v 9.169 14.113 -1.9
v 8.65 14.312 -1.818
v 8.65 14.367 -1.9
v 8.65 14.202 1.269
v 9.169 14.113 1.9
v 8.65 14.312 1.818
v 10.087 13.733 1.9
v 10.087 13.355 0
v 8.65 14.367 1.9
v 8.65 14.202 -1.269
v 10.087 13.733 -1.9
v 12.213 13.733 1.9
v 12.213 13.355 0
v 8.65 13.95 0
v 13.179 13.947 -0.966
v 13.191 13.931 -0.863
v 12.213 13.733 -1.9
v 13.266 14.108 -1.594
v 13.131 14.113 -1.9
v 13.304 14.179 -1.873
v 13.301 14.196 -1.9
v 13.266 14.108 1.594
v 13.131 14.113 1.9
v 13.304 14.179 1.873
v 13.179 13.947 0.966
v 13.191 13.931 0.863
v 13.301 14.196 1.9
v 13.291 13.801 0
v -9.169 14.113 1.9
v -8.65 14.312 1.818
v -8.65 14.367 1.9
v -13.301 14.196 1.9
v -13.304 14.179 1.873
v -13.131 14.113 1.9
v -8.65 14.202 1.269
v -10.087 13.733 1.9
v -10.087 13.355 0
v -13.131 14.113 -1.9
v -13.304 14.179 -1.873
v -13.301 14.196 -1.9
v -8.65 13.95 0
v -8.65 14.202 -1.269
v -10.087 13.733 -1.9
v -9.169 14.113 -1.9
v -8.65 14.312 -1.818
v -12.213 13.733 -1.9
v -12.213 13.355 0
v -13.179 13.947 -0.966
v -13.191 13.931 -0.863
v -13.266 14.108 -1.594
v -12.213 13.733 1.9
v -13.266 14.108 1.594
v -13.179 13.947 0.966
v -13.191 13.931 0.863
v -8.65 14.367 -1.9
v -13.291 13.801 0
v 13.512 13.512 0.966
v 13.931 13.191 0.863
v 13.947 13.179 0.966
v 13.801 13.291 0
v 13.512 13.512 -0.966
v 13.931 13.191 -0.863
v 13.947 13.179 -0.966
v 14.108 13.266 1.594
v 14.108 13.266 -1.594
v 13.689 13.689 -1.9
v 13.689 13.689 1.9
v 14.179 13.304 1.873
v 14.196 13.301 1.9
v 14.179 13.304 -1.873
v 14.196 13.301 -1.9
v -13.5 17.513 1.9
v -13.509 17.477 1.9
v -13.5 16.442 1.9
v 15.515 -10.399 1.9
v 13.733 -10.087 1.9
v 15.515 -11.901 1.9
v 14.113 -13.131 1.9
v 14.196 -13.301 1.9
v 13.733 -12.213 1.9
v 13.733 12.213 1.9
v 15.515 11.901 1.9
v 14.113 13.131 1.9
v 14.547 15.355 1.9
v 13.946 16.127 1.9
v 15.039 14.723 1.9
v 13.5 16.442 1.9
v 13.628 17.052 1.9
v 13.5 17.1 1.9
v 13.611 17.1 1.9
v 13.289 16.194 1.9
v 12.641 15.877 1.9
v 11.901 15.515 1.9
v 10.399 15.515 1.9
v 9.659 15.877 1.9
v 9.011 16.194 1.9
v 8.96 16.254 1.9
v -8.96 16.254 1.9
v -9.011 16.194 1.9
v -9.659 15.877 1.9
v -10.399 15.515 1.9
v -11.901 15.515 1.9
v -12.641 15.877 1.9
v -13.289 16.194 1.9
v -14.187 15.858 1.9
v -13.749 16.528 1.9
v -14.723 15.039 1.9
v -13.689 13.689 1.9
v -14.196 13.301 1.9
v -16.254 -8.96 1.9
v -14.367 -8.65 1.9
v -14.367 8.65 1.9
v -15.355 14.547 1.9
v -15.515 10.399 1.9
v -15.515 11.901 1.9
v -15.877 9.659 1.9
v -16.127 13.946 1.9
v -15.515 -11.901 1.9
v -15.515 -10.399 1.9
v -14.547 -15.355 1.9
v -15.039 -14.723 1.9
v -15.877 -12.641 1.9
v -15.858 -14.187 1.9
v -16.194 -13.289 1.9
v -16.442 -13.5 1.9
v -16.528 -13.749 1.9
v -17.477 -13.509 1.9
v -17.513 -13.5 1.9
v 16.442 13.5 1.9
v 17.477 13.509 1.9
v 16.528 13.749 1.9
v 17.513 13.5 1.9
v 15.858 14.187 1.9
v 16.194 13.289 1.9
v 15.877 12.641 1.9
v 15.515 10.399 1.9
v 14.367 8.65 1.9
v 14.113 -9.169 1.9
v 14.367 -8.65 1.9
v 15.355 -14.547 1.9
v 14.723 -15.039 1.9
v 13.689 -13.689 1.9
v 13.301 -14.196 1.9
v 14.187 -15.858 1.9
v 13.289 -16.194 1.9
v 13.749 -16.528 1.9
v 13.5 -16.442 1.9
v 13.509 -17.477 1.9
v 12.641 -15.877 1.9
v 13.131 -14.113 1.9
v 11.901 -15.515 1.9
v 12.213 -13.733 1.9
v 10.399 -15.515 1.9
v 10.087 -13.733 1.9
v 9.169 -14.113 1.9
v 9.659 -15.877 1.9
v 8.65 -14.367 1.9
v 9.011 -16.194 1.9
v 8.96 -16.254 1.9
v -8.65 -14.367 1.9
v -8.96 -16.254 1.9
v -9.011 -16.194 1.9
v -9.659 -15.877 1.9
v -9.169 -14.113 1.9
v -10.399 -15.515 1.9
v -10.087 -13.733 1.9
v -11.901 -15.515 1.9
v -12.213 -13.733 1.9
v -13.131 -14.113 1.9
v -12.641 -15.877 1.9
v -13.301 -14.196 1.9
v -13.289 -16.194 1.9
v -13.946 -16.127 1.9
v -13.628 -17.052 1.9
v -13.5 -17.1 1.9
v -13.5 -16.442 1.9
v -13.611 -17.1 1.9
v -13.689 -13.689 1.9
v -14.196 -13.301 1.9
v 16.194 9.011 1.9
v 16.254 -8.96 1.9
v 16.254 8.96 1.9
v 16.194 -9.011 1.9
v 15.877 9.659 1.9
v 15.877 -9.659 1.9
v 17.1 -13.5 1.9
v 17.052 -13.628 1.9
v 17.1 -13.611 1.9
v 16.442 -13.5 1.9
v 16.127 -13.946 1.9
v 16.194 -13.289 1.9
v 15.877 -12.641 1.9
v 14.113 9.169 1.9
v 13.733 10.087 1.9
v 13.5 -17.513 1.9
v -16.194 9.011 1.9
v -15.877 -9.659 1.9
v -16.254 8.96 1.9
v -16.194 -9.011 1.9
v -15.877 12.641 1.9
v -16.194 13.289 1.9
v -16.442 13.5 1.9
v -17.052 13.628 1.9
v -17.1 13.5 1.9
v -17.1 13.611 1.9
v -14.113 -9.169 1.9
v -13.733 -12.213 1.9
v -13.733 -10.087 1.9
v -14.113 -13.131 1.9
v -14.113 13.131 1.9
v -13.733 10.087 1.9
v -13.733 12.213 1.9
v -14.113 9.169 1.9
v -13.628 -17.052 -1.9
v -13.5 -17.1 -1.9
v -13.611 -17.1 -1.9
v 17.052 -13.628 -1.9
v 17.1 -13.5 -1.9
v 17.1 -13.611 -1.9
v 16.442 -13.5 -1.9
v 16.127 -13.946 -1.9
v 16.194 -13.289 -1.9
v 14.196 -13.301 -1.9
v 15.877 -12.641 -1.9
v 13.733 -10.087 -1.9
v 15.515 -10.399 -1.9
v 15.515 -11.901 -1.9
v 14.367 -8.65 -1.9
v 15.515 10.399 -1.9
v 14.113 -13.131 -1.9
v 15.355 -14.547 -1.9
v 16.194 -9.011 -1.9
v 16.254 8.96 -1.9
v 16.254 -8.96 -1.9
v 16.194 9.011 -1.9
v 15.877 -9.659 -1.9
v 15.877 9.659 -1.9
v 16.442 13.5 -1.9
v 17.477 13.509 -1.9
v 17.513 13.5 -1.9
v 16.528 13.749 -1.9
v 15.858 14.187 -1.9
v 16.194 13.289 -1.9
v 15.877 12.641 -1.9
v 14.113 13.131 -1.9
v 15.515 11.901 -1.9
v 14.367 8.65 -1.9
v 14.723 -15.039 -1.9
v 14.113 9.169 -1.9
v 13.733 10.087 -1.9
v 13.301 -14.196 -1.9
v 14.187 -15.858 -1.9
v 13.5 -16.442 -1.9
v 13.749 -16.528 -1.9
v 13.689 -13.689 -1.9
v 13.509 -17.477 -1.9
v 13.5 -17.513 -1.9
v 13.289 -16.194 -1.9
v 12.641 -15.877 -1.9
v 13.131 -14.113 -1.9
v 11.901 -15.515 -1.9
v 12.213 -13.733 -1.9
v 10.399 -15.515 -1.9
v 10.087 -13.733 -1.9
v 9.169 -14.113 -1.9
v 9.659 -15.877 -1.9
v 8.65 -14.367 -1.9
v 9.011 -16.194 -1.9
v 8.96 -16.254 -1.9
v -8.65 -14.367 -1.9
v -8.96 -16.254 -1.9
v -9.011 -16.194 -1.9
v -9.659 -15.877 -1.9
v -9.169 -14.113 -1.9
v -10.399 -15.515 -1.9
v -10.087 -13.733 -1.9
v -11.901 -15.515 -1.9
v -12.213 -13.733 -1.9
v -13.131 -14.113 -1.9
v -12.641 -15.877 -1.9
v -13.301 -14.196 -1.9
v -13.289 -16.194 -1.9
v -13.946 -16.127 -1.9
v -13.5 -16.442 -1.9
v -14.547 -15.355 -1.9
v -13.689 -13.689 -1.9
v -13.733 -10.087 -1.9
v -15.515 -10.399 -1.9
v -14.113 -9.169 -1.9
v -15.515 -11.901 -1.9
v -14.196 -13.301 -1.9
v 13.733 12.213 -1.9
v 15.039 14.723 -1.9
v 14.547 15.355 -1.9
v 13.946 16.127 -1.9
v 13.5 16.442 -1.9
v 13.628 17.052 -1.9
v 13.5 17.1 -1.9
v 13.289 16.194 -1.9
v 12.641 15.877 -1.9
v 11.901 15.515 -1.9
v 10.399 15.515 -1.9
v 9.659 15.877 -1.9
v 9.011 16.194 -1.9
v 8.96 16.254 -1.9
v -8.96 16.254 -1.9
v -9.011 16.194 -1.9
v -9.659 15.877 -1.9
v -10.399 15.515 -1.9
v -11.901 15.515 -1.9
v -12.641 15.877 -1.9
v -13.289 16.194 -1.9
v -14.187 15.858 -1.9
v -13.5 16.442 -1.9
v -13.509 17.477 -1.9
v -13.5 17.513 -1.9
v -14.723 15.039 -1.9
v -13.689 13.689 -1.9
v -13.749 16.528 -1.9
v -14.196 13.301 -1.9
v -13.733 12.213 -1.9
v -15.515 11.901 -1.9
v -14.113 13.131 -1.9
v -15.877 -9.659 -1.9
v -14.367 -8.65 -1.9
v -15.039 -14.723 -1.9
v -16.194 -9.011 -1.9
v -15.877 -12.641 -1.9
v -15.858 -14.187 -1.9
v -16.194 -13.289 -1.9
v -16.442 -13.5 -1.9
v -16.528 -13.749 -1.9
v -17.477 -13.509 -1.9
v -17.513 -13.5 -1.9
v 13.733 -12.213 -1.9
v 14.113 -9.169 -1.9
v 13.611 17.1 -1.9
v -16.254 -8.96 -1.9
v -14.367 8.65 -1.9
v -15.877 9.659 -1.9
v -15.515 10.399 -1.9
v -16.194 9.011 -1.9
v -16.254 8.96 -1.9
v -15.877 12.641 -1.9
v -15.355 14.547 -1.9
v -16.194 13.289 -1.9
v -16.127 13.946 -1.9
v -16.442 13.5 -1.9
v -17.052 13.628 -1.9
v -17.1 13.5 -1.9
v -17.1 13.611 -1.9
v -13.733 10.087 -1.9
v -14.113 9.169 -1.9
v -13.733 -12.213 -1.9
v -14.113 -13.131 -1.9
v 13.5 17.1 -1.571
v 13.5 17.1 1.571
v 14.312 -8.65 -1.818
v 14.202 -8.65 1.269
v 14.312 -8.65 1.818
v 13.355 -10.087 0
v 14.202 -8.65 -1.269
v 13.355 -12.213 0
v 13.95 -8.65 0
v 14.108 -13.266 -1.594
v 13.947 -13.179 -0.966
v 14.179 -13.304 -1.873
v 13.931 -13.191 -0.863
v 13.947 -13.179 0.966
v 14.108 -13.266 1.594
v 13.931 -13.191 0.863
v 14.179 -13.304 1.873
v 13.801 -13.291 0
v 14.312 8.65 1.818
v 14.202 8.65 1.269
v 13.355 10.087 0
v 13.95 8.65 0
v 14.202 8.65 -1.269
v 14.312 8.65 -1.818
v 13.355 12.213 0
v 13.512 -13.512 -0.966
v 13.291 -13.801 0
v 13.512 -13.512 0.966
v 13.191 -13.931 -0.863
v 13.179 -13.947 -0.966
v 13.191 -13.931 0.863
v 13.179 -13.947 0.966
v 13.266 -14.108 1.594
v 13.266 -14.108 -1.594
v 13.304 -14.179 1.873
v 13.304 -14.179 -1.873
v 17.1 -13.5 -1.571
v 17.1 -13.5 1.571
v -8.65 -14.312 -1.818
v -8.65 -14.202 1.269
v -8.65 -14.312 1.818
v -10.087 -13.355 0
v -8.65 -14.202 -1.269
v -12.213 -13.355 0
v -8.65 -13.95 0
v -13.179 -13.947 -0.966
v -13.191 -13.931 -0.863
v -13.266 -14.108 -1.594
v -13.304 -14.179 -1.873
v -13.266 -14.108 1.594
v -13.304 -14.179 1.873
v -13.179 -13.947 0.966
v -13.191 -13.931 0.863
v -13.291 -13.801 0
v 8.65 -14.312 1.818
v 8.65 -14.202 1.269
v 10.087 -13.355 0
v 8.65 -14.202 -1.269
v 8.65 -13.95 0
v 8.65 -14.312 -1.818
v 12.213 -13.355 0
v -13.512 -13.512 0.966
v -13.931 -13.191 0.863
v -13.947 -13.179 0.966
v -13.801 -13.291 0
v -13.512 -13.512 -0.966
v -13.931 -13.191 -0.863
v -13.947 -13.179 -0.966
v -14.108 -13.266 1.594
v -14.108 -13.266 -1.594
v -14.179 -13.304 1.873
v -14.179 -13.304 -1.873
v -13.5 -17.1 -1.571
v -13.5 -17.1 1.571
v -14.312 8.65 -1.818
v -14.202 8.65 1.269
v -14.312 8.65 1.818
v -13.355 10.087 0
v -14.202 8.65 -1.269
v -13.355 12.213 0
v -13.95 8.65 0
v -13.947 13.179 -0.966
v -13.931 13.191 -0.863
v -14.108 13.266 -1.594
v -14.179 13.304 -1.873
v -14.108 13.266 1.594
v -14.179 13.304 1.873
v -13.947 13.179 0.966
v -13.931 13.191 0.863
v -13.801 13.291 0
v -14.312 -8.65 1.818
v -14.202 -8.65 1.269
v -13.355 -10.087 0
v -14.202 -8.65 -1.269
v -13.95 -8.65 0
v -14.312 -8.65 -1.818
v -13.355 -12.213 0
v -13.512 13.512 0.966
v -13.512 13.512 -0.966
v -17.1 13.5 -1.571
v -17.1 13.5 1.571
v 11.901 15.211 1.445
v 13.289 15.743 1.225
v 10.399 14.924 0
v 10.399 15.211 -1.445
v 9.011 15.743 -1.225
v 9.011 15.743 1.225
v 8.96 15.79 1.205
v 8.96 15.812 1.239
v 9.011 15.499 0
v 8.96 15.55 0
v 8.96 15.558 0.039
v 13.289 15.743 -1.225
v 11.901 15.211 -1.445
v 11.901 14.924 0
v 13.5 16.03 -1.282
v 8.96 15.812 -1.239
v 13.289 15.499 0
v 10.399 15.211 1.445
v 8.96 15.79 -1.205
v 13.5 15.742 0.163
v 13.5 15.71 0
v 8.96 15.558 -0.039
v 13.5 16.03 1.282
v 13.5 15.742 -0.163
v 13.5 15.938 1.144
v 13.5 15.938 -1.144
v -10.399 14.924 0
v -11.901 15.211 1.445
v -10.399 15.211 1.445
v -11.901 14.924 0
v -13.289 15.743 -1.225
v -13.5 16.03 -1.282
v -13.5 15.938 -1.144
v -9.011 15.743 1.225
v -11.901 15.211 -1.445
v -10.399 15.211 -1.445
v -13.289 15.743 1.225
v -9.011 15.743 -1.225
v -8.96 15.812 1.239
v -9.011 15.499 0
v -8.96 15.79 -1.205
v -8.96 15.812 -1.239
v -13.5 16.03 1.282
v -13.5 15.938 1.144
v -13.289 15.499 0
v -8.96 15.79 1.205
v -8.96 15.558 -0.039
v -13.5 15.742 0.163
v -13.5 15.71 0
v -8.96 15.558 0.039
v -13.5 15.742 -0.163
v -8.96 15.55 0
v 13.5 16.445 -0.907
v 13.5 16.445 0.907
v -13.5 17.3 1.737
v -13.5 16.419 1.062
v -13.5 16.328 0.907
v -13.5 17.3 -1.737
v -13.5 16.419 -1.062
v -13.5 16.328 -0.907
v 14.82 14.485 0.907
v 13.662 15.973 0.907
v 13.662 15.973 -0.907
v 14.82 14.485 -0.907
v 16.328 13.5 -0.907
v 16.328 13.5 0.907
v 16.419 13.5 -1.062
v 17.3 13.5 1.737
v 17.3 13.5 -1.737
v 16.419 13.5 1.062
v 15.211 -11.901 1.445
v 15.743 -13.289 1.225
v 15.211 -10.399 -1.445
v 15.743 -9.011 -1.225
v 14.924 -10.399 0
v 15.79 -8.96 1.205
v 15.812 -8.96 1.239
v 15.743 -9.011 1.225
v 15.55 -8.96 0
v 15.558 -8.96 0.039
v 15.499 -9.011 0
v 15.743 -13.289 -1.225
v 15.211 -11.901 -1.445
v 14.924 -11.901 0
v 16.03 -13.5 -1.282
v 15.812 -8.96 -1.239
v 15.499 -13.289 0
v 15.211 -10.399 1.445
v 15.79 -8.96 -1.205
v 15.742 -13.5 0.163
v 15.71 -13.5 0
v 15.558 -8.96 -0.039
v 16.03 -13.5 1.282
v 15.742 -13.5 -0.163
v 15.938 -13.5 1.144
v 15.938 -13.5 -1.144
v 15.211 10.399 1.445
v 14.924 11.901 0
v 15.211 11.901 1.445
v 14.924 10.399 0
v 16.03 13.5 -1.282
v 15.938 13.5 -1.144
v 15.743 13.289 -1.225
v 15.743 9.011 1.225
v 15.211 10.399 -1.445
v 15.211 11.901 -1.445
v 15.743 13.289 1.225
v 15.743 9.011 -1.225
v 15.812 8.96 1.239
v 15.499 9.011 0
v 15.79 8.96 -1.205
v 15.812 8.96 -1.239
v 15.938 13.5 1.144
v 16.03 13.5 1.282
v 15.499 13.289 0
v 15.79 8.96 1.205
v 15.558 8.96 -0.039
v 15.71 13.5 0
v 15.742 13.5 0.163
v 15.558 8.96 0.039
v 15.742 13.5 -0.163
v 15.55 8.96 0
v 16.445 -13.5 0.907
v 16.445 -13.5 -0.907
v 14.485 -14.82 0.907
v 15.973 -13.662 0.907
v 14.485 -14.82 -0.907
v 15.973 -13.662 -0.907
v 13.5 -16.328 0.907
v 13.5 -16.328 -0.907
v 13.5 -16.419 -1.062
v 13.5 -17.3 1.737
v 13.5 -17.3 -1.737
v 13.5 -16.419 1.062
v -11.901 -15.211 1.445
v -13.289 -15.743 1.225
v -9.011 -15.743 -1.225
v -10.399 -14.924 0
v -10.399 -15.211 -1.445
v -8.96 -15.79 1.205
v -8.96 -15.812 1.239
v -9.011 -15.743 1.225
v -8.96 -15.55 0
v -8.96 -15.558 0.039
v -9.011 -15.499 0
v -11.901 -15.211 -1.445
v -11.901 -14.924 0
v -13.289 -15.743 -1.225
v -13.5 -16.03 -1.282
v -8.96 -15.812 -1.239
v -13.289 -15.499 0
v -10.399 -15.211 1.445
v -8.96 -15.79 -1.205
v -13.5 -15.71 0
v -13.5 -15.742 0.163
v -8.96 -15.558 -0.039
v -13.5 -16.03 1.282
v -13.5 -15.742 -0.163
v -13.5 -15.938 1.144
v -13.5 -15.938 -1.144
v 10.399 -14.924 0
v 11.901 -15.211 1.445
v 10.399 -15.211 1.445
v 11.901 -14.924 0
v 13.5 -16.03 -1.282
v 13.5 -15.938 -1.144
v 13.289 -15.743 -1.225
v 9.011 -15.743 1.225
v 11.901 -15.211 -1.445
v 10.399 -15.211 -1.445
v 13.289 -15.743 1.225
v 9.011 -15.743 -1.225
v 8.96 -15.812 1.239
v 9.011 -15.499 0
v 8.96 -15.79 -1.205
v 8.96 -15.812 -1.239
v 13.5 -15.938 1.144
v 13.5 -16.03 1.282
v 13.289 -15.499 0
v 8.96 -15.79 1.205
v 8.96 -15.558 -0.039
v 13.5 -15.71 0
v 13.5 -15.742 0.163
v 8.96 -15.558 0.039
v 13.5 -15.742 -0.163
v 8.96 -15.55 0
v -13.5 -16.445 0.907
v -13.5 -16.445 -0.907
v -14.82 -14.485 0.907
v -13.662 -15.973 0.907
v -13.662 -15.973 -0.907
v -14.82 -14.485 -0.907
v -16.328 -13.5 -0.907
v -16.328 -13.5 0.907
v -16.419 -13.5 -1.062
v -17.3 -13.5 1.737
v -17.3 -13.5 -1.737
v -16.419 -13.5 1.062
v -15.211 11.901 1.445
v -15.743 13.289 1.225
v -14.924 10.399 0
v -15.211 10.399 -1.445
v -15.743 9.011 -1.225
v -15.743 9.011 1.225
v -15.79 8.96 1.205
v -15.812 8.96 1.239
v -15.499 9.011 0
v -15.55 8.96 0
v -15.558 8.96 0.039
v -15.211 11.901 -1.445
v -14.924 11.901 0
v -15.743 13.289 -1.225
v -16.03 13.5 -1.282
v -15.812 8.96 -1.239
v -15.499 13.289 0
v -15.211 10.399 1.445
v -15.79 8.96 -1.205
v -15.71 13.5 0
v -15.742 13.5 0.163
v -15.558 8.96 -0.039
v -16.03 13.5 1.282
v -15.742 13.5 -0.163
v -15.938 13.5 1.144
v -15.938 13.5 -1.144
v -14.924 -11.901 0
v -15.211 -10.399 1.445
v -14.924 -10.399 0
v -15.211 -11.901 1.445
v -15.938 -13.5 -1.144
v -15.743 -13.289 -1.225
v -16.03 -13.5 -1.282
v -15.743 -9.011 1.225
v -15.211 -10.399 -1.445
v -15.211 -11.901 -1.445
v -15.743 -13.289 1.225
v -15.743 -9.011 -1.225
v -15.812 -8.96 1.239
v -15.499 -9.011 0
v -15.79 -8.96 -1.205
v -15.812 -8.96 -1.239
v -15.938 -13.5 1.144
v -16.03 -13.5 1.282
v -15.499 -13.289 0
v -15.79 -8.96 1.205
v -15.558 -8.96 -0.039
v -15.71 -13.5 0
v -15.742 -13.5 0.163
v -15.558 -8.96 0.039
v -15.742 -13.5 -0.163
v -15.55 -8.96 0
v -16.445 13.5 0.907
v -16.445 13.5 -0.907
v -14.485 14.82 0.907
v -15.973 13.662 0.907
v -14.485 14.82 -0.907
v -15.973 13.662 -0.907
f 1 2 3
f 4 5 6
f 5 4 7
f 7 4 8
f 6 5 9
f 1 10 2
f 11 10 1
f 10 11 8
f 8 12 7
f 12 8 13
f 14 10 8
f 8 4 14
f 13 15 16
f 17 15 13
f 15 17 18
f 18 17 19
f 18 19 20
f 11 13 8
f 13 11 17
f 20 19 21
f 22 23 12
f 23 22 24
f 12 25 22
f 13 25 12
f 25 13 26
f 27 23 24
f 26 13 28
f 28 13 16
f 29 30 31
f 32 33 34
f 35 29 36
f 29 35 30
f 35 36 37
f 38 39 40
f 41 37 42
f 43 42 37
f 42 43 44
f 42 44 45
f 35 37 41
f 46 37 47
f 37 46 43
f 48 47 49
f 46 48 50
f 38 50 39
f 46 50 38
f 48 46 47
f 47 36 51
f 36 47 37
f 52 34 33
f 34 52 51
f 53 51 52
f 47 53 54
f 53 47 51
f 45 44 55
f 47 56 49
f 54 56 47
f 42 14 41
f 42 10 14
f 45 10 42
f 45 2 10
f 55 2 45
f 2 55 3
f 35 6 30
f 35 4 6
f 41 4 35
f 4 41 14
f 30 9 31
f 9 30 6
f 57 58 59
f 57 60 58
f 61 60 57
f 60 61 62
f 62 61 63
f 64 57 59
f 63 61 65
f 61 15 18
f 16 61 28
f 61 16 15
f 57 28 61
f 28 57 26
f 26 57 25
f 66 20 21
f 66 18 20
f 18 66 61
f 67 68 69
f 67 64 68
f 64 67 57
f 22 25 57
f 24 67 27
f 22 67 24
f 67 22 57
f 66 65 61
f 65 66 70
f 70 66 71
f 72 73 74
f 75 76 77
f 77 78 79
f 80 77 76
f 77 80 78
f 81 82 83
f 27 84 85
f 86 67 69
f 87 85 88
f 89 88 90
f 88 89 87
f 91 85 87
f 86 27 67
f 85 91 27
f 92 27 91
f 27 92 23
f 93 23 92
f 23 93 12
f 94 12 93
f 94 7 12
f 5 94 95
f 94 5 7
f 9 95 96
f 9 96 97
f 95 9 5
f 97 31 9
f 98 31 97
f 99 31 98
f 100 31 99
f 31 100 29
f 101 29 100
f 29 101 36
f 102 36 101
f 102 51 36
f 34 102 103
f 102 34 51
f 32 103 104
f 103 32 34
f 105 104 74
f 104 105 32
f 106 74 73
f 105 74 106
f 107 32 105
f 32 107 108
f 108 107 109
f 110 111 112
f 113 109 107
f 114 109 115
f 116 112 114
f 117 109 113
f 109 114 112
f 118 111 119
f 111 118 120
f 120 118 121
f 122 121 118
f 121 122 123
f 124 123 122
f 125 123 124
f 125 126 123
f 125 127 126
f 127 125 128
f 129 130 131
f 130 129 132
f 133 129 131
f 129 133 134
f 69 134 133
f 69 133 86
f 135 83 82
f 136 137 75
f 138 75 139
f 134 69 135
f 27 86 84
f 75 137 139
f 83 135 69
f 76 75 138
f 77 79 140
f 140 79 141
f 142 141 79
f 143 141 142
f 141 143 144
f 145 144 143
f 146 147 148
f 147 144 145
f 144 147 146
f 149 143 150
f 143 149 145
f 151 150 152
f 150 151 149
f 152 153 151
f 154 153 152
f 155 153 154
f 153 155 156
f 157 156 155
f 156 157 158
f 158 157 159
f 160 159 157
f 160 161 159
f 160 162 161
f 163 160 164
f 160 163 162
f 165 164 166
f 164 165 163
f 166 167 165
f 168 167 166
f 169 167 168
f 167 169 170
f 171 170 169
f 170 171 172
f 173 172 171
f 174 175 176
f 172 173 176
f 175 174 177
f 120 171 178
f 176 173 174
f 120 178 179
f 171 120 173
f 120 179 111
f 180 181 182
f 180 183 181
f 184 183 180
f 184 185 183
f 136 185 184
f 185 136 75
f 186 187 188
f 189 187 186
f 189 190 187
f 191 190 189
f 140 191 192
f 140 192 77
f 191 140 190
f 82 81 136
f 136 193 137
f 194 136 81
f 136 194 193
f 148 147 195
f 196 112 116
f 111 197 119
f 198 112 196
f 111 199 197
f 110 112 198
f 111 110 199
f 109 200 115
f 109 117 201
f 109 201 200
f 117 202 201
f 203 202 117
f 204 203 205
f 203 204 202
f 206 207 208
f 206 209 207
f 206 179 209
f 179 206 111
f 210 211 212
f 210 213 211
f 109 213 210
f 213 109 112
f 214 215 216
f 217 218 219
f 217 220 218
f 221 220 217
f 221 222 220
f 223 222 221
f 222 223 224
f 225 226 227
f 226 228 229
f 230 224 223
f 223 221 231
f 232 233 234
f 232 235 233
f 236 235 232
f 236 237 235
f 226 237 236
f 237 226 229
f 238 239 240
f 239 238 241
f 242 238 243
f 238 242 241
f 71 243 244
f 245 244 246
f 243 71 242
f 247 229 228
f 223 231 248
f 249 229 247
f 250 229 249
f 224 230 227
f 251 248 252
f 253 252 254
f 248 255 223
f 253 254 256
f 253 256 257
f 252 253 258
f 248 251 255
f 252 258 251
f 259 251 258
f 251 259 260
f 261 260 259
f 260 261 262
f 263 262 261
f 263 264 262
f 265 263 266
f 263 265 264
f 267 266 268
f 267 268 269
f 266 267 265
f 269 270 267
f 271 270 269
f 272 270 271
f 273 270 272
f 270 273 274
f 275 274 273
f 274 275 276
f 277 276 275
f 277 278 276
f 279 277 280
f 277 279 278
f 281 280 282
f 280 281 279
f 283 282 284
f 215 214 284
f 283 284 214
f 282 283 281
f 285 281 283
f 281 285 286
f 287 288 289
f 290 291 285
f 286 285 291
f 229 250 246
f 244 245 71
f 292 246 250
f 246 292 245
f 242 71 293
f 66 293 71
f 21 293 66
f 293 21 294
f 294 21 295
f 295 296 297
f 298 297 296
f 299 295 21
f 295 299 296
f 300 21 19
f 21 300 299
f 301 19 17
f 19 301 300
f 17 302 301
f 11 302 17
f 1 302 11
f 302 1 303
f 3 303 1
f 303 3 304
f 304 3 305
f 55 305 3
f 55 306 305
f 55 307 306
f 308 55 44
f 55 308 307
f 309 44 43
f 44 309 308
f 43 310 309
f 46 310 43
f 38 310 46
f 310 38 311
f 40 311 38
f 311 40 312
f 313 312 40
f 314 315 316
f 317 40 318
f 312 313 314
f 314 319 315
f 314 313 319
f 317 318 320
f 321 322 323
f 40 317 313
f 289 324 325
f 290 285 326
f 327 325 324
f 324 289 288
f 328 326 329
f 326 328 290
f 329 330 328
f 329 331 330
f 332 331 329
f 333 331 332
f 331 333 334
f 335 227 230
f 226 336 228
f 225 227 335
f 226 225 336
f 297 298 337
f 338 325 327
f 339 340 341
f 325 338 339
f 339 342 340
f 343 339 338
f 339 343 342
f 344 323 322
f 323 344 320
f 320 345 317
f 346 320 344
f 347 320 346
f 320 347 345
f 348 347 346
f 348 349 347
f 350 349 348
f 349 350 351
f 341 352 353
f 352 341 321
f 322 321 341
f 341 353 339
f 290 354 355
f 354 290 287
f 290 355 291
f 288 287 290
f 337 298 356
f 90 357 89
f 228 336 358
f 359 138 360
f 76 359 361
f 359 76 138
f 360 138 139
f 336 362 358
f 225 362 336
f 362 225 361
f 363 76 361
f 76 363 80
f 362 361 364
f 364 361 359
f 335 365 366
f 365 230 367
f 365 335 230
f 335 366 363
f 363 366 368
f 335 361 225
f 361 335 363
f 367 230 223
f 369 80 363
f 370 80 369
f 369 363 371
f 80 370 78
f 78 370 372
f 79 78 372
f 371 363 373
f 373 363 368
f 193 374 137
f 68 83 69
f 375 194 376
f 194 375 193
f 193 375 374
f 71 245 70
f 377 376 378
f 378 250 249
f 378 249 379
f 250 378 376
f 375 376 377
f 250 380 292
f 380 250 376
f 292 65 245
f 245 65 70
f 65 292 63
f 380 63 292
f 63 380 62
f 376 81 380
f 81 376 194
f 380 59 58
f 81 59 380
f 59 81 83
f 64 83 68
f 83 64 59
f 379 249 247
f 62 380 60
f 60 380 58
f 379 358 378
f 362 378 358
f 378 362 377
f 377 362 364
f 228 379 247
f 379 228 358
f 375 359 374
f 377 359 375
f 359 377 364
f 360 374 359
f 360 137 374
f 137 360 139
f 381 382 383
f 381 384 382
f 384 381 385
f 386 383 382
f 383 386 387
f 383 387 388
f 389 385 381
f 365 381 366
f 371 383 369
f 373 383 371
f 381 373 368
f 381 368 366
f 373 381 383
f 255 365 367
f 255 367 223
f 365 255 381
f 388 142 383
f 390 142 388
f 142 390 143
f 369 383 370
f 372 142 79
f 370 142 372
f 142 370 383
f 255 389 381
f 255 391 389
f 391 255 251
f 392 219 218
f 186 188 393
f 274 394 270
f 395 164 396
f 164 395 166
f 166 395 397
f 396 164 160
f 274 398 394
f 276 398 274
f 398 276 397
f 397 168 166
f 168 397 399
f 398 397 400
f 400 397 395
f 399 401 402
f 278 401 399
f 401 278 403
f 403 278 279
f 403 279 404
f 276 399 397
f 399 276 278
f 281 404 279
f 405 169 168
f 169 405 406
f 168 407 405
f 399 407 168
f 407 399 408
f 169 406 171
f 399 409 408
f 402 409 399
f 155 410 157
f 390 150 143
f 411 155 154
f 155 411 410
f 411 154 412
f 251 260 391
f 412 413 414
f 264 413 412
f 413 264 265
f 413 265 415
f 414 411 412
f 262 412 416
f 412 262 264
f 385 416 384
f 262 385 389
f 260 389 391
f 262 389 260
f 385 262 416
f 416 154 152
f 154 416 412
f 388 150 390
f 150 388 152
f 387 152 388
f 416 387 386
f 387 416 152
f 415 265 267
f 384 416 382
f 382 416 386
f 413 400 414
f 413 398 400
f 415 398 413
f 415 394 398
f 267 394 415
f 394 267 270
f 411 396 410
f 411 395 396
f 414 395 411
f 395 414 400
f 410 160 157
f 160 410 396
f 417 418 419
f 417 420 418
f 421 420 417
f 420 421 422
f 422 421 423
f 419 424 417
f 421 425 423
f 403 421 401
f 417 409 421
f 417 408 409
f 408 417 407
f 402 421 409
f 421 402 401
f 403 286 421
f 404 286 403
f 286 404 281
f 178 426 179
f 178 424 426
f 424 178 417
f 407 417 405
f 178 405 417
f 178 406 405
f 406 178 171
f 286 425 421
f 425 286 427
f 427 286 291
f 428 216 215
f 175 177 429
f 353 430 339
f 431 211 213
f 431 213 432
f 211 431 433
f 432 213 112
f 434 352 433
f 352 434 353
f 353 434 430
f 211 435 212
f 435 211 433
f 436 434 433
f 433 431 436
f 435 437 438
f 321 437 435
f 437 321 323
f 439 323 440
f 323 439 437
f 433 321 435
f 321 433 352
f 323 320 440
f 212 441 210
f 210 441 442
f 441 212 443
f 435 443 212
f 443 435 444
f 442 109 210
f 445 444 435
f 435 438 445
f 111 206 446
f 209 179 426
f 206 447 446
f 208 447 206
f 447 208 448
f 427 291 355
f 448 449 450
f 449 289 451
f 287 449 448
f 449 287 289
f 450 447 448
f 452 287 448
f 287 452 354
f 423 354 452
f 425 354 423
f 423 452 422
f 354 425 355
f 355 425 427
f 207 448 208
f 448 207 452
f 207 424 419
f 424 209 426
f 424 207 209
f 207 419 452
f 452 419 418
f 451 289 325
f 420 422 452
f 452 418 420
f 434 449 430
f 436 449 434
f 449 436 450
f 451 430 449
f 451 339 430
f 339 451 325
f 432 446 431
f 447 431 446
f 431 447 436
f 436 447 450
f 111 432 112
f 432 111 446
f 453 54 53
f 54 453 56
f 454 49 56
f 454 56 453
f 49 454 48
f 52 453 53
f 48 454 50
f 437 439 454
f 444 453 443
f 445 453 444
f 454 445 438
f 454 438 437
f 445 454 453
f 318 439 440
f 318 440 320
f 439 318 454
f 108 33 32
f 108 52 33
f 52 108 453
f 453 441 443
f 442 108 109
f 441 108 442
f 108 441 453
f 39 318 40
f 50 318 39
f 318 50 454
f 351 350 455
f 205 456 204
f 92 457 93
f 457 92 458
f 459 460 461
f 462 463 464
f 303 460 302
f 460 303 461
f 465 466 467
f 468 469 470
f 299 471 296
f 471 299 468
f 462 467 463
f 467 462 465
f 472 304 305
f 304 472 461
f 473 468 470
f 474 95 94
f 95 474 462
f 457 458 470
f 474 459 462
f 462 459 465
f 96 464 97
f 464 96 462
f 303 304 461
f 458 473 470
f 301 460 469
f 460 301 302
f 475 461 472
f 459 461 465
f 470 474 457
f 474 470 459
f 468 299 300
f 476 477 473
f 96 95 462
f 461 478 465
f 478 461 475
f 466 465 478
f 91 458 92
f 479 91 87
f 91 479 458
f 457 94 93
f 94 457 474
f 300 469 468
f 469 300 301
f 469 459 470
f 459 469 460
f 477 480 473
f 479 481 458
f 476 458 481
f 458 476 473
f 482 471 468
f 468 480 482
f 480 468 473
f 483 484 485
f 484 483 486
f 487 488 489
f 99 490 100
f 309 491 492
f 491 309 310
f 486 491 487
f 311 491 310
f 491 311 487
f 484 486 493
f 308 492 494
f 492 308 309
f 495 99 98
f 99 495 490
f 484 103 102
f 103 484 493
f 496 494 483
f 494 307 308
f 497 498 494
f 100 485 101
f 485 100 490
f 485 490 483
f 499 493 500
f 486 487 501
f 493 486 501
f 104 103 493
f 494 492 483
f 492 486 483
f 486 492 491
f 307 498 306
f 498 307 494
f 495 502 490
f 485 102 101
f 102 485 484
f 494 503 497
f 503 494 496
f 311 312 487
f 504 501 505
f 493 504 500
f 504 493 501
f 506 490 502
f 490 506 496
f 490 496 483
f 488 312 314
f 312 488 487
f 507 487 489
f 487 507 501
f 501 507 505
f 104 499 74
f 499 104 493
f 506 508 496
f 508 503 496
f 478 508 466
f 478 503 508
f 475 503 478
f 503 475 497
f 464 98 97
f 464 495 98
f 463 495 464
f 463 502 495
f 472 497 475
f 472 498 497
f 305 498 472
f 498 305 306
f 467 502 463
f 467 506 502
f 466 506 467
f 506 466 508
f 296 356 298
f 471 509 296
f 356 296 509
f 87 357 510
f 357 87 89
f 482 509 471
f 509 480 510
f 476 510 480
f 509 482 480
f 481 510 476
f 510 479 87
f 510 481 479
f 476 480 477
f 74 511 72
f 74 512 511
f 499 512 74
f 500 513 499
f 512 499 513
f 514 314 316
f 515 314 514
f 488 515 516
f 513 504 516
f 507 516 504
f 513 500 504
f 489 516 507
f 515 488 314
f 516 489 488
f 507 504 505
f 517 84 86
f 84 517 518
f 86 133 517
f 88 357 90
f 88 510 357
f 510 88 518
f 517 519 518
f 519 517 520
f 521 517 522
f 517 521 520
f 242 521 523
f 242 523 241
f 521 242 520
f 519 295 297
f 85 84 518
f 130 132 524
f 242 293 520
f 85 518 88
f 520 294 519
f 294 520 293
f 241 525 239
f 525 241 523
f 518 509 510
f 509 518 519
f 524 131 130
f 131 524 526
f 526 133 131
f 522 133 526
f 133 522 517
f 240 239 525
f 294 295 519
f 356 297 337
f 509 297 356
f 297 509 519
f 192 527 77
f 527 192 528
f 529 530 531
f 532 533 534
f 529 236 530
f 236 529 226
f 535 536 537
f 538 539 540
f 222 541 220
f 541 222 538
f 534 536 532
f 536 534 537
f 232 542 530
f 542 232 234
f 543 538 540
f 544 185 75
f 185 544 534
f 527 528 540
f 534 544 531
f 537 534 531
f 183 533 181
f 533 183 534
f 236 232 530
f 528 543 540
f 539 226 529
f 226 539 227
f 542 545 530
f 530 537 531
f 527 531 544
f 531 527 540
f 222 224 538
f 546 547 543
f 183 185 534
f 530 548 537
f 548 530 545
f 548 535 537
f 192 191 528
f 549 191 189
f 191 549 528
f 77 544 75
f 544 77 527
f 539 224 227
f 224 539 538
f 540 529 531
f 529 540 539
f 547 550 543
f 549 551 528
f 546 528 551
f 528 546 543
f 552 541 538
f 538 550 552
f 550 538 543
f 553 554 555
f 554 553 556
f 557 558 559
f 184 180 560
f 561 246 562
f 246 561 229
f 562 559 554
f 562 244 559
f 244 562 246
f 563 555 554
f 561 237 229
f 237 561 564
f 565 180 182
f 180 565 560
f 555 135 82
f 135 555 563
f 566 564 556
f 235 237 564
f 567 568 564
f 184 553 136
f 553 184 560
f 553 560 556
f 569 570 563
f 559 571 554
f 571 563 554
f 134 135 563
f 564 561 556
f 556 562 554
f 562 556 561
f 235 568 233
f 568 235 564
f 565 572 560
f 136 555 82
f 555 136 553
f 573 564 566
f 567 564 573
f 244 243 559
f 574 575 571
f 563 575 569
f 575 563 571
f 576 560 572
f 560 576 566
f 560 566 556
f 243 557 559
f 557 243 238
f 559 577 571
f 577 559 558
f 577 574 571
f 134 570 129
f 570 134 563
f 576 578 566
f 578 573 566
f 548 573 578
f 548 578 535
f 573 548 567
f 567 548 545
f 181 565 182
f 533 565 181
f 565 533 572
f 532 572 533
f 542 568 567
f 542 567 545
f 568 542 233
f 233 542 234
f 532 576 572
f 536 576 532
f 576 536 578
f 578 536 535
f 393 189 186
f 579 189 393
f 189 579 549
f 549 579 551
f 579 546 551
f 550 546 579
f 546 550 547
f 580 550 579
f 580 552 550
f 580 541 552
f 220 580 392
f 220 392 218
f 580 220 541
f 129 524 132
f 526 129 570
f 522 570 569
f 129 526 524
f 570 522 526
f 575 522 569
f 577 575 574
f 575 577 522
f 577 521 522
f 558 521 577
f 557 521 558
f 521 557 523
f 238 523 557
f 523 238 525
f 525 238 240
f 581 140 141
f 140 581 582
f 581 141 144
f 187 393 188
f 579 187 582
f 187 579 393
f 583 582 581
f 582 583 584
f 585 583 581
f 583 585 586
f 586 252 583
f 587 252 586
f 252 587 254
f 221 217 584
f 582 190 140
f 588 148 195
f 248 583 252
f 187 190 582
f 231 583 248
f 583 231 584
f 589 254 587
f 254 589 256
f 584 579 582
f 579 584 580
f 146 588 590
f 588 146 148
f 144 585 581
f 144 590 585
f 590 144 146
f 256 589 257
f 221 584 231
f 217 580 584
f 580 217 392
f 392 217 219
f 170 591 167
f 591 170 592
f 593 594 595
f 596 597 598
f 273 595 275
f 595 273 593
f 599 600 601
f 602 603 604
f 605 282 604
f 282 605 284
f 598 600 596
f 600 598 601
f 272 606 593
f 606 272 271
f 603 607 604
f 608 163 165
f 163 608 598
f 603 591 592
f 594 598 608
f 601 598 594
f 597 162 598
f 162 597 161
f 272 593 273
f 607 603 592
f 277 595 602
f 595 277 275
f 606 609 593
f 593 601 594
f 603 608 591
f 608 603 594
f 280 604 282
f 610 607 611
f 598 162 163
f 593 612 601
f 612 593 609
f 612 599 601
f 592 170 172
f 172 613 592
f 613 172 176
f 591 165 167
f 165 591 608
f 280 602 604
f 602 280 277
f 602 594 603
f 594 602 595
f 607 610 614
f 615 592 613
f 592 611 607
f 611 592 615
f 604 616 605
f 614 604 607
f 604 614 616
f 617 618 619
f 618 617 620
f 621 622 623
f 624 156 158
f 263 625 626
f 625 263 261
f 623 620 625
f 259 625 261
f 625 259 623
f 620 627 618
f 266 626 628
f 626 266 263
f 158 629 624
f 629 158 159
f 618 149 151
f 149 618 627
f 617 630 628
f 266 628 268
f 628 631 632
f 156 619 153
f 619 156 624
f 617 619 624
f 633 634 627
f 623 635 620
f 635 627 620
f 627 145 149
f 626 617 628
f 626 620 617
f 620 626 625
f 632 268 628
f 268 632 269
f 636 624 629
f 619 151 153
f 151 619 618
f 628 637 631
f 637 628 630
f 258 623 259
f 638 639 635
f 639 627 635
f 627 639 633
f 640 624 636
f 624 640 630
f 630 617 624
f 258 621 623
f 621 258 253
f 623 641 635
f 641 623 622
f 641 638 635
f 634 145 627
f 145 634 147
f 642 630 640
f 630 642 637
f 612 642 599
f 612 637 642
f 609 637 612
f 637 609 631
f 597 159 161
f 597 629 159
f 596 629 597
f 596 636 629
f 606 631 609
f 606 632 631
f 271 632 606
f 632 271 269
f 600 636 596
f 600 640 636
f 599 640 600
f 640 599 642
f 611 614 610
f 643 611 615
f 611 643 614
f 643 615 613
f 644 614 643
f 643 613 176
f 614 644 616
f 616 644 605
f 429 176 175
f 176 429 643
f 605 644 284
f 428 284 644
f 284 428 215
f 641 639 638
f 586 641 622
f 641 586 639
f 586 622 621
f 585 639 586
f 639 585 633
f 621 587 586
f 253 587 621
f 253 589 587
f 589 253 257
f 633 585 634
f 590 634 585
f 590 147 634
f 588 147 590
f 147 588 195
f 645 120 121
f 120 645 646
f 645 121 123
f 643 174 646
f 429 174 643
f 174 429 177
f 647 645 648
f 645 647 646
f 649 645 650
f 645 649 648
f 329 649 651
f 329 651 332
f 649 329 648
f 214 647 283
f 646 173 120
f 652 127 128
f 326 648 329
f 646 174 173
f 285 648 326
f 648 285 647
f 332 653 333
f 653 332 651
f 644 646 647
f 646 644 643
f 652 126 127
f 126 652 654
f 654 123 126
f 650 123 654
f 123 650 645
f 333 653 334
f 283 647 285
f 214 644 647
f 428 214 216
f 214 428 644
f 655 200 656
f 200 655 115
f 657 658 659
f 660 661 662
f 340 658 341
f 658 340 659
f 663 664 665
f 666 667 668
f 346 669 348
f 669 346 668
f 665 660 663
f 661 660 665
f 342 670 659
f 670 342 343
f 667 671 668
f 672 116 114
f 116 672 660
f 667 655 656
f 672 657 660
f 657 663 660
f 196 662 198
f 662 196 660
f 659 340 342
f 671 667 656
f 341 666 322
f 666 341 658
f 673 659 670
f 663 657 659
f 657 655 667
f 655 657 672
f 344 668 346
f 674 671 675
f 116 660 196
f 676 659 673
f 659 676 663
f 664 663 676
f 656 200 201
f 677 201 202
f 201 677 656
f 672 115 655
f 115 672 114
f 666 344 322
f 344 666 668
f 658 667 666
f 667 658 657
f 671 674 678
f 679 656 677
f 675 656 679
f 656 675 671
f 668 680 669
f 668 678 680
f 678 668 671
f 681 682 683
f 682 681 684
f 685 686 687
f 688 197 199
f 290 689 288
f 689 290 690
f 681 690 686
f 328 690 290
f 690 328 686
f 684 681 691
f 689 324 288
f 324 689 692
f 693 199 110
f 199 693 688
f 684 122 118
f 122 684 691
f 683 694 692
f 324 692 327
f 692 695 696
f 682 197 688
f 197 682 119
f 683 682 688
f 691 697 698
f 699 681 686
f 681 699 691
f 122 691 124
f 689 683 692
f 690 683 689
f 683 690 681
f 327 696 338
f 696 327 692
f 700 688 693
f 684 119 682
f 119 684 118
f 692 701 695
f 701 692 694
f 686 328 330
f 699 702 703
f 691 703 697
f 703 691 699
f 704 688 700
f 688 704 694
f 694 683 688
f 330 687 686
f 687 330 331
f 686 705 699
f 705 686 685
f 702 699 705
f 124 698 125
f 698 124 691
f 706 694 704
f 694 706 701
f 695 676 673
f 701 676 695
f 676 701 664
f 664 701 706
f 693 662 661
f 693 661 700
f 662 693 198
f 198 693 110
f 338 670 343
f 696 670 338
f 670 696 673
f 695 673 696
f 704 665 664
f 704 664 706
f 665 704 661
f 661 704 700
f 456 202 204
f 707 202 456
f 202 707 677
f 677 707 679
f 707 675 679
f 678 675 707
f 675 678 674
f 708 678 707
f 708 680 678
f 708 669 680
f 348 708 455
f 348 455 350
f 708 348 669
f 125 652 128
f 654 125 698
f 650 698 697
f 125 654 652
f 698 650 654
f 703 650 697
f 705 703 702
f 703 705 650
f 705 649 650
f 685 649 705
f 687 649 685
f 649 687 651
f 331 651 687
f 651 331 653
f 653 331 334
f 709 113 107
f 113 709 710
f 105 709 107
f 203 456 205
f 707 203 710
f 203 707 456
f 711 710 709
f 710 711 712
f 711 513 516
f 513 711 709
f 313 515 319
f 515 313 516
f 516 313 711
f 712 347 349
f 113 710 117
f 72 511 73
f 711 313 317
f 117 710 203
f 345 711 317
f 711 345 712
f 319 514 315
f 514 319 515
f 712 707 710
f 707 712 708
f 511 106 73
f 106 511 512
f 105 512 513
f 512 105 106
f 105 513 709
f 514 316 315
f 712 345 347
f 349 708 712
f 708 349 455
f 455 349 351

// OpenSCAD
// file: syms.scad
module symY(t) {
    translate(t)
        children();
    mirror([0,1,0])
        translate(t)
            children();
}
module symX(t) {
    translate(t)
        children();
    mirror([1,0,0])
        translate(t)
            children();
}

module symZ(t) {
    translate(t)
        children();
    mirror([0,0,1])
        translate(t)
            children();
}

module	symXY(t) {
	tx=t[0];
	ty=t[1];
	tz=t[2];
	symX([tx,0,0])
	symY([0,ty,tz])
		children();
}
// main file
use <syms.scad>
W=1.6;
BALL_D=11;
STICK_L=26.4;
STICK_D=5.7;
STICK_END_D=7.1;
STICK_END_H=4.1;

SP=.6; // spacing 

ENL=STICK_END_D-STICK_D;
echo("ENL",ENL);

module stickZ(off=0) {
    $fn=16;
    intersection() {
        union() {
            cylinder(h=STICK_L,d=STICK_D+off,center=true);
            symZ([0,0,(STICK_L-STICK_END_H)/2])
            sphere(d=STICK_END_D+off);
        }
        cube(STICK_L+off,center=true);
    }
}

module stick(off=0) {
    rotate(90,[0,1,0])
    stickZ(off);
}

module stickAndBall(off) {
    stick(off);
    translate([(STICK_L+BALL_D)/2,0,0])
    sphere(d=BALL_D+off,center=true);
}

module nGon(eLength,n) {
    d=360/n;
    r=eLength/2/tan(d/2);
    echo(d);
    echo("r",r);
    
    for(a=[0:d:360]) {
        translate([sin(a),cos(a),0]*r)
        rotate(-a)
        children();
    }
}


module panel(n) {
    E=STICK_L+BALL_D;
    difference() {
//#        nGon(E,n)
//        rotate(90,[0,1,0])
  //      cylinder(d=STICK_D+SP+2*W,h=E,center=true);
        nGon(E,n)
        union() {
            intersection() {
                stickAndBall(SP+2*W);
                G=STICK_D;
                translate([0,-G/2-W,0])
               cube([E,G,STICK_D*2/3],center=true);
            }
        }
        
        nGon(E,n)
        stickAndBall(SP);
    }
}

mode="p4";

if(mode=="p4") {
    panel(4);
}
if(mode=="p6") {
    panel(6);
}

if(mode=="p3") {
    panel(3);
}
